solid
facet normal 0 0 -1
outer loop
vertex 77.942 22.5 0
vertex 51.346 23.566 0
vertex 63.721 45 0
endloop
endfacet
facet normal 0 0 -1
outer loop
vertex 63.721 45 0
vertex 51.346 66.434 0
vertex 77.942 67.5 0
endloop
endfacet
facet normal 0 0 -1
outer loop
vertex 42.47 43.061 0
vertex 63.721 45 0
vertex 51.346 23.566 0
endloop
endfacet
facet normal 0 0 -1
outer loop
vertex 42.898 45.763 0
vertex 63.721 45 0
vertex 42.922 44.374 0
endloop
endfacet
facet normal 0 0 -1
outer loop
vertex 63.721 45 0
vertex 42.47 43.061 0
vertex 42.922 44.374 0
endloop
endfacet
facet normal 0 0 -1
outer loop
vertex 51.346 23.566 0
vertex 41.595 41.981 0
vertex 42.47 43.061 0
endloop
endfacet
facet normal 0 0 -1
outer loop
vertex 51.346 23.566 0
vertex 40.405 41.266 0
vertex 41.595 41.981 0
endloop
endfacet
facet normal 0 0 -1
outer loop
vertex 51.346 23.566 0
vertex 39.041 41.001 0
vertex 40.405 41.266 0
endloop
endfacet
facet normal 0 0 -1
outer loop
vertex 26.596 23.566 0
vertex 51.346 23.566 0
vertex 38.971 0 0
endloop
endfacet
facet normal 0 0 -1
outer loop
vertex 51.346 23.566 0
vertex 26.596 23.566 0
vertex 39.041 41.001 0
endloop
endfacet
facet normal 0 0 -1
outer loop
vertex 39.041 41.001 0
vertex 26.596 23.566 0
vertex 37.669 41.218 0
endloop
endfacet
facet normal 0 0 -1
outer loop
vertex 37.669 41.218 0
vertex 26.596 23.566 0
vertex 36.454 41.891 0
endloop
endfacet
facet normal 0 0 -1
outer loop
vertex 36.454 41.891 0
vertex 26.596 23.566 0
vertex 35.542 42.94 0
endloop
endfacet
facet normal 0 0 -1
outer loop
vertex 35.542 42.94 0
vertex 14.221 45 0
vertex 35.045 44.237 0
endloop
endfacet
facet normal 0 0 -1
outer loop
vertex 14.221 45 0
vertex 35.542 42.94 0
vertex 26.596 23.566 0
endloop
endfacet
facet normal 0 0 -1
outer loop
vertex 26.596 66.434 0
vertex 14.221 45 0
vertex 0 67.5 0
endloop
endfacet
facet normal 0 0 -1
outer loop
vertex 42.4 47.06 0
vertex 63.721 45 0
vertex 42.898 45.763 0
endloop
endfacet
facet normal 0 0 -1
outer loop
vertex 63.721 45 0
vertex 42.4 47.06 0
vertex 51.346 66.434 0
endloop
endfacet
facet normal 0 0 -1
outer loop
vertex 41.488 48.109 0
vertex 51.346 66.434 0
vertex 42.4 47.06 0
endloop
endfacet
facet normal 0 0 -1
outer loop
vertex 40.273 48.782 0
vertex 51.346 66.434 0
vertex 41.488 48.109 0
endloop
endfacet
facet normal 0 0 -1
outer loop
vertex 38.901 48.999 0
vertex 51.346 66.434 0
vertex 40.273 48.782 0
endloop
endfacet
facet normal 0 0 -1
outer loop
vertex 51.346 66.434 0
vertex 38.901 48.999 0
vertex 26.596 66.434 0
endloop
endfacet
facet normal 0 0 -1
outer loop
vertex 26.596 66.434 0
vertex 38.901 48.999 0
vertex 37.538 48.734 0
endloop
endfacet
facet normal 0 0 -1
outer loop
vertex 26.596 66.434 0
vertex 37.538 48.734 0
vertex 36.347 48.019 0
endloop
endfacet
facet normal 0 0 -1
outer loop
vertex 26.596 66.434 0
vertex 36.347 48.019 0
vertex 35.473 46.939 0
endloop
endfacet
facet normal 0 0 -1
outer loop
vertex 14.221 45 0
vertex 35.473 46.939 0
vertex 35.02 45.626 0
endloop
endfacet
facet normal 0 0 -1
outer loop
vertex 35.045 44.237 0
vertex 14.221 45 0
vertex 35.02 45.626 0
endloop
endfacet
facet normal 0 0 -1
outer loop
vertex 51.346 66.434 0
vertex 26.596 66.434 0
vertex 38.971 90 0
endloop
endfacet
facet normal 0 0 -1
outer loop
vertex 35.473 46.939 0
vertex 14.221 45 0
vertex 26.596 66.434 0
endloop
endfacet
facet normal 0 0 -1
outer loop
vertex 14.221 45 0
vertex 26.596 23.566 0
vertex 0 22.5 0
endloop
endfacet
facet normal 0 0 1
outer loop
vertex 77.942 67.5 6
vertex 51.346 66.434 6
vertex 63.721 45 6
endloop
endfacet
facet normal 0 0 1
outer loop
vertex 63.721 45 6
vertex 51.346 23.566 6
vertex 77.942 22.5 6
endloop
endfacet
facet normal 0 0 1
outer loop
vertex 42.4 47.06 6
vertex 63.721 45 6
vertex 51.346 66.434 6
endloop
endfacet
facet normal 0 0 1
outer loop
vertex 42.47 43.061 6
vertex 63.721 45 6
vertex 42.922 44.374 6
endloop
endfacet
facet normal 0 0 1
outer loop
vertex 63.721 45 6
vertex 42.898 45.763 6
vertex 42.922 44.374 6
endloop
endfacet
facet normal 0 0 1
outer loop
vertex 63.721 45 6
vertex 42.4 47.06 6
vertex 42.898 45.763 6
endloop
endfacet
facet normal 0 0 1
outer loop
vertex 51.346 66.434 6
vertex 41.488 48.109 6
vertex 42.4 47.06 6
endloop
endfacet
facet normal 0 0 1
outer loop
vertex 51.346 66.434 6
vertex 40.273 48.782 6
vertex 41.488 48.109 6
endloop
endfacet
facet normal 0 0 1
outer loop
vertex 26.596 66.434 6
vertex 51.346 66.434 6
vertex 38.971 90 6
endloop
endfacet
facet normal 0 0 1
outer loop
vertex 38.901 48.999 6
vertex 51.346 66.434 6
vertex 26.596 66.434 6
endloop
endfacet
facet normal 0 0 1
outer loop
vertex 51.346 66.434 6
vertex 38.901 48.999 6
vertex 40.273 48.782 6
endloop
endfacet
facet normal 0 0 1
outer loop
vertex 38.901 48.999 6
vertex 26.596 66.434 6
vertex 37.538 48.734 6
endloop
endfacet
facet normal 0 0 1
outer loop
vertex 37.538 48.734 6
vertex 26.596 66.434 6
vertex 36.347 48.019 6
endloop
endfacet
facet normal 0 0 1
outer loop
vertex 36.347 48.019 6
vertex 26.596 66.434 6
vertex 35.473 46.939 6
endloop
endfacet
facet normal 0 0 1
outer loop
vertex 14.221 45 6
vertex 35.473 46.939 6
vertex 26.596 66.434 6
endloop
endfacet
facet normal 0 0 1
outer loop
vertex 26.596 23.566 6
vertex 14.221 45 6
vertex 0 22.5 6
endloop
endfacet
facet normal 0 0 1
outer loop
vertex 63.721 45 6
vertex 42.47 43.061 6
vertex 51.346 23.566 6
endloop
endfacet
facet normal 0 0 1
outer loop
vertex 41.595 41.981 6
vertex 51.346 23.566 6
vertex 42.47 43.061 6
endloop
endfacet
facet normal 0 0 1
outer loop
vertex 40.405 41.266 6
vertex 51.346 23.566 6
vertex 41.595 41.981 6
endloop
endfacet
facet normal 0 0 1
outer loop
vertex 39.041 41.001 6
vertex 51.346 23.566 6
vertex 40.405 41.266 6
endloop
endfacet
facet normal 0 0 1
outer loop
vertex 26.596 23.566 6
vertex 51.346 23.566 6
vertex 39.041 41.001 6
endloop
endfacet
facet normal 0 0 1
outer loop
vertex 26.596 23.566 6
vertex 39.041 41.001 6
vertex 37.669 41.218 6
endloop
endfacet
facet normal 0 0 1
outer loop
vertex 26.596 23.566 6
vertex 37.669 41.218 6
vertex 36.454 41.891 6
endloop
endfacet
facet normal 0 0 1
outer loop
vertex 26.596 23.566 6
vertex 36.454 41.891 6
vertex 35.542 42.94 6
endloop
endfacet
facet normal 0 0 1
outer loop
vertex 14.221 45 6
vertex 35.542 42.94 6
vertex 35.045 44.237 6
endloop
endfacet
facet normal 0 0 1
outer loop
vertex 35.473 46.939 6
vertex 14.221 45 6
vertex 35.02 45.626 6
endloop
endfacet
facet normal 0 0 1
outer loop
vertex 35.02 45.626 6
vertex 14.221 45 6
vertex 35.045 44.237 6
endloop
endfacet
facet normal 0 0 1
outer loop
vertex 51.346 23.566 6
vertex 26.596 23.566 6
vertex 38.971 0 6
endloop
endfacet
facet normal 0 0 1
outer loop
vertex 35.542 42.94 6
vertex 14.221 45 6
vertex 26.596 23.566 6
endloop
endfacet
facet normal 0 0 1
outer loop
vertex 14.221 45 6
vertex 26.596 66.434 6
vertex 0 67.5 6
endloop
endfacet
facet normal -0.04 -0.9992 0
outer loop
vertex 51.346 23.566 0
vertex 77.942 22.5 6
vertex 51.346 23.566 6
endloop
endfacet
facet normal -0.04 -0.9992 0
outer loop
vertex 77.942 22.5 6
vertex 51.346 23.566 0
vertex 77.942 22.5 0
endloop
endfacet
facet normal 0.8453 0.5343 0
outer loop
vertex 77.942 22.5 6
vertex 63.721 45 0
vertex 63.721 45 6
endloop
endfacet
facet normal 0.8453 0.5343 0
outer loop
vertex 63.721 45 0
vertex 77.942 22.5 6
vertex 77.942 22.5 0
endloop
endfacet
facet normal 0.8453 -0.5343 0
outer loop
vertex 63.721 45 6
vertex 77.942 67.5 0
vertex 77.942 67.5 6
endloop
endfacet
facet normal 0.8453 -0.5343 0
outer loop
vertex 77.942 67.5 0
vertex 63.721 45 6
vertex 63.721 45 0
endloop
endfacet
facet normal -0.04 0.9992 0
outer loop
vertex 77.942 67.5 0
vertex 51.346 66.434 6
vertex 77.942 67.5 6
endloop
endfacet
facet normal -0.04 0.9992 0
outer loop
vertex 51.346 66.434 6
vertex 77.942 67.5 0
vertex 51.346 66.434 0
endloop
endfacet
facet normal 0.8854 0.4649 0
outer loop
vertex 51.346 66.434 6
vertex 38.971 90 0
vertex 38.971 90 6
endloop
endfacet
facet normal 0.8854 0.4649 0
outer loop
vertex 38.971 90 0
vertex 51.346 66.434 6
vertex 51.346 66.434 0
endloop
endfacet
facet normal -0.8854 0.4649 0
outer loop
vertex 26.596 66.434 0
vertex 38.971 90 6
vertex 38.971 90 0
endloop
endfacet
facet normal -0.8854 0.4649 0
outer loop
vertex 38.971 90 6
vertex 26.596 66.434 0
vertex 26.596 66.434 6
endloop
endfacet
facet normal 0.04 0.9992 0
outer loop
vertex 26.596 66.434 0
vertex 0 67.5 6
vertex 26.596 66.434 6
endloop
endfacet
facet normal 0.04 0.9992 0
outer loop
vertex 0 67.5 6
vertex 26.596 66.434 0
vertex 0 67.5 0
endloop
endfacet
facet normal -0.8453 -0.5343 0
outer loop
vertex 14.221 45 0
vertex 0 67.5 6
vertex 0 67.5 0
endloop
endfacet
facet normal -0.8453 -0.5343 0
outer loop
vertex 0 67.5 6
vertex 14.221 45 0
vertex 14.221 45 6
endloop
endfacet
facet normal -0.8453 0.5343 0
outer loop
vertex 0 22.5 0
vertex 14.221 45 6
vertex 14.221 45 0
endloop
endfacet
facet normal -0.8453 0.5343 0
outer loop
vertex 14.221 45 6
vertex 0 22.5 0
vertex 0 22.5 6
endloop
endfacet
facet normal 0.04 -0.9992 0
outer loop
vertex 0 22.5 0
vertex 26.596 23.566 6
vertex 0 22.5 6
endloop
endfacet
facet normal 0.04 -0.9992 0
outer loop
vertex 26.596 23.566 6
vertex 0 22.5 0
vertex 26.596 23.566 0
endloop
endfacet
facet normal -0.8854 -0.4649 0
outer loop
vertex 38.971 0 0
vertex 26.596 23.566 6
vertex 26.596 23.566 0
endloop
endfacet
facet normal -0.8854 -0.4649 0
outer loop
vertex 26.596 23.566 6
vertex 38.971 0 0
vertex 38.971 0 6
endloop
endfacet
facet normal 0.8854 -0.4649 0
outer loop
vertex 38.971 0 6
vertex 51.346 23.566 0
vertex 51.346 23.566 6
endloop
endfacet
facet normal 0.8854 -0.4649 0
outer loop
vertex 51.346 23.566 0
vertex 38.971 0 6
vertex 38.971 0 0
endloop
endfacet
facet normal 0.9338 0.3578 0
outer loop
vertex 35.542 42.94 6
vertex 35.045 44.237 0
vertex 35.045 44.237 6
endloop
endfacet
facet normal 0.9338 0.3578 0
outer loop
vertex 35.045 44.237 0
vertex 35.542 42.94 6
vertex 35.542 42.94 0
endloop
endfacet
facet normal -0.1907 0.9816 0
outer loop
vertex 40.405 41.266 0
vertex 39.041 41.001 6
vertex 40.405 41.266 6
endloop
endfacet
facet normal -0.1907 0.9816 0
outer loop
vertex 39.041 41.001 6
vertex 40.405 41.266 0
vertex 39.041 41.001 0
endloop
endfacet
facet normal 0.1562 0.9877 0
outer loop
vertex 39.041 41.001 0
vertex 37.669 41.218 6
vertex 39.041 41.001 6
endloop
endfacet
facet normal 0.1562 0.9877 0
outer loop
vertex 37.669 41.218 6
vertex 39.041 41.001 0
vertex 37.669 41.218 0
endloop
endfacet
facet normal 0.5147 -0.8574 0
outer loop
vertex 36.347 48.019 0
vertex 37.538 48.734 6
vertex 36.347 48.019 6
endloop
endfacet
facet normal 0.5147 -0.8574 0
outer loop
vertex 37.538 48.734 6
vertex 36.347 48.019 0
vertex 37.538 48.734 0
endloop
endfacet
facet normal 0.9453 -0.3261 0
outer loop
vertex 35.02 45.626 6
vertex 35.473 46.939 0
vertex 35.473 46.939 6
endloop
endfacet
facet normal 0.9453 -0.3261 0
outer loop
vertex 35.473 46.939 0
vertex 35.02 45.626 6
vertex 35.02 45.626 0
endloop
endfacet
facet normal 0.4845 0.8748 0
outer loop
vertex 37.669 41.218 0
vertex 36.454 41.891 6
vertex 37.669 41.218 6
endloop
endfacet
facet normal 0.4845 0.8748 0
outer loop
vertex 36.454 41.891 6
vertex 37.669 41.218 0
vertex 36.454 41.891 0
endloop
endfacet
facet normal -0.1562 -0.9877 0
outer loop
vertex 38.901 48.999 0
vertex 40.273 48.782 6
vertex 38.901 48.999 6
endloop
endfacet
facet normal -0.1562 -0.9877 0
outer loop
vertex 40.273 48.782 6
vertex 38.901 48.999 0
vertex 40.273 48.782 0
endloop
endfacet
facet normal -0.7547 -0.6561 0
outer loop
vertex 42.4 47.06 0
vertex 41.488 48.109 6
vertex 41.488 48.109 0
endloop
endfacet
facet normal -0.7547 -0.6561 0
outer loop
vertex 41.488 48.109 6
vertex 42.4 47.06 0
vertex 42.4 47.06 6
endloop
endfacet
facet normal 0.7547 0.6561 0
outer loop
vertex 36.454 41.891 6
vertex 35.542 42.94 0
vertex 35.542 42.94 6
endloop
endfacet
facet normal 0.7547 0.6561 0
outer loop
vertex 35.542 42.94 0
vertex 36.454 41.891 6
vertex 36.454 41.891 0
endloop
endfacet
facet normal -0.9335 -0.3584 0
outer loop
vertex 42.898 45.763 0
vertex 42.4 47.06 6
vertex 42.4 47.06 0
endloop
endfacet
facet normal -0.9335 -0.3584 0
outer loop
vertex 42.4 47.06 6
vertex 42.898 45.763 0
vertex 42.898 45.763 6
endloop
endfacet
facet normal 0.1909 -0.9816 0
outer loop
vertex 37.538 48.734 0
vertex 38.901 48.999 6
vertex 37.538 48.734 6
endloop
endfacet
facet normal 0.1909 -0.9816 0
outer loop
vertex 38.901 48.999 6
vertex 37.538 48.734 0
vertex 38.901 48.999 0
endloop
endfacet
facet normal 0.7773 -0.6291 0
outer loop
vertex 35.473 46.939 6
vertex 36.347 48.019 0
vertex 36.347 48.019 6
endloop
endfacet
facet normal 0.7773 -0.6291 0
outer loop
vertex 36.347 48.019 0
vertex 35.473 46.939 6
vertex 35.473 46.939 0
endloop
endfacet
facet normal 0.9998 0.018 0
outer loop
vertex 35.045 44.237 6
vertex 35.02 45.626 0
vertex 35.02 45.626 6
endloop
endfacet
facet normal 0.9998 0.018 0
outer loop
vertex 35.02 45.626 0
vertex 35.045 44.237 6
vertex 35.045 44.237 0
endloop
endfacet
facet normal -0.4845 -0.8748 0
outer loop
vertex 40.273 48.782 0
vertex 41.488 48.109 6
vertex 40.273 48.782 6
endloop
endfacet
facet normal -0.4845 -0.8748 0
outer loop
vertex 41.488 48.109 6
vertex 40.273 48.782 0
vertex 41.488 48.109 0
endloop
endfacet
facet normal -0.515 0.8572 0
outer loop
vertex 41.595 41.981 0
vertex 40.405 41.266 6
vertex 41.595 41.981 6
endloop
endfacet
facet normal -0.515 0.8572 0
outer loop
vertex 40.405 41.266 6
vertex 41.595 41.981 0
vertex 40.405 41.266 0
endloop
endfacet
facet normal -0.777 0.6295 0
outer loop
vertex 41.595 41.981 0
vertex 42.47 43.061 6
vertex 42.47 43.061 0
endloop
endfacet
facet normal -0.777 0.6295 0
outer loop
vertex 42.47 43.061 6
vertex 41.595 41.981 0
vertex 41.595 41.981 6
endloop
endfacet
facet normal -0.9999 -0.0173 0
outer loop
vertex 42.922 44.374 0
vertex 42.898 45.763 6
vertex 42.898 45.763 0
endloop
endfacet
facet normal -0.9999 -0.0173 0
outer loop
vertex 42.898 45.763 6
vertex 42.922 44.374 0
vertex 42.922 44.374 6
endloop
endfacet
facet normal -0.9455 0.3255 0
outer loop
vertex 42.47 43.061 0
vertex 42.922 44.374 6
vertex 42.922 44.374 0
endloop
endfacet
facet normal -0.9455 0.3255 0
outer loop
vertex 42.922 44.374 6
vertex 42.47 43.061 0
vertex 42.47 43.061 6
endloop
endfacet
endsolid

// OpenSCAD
$fn = 32;

// ----------------------------------------------------------------------
// Star wheel: 6-point star, R45
// ----------------------------------------------------------------------

// --- parameters (mm) ---
n_points = 6;             // number of points / teeth
r_out = 45;               // tip radius
r_in = 24.75;             // root radius
bore_r = 4;               // centre bore radius
plate_t = 6;              // plate thickness, Z (extrusion height)
bore_d = 8;               // centre bore diameter

profile = [[38.971, 90], [26.596, 66.434], [0, 67.5], [14.221, 45], [0, 22.5], [26.596, 23.566], [38.971, 0], [51.346, 23.566], [77.942, 22.5], [63.721, 45], [77.942, 67.5], [51.346, 66.434]];  // primary outline, 12 points, counter clockwise
void_1 = [[42.898, 45.763], [42.4, 47.06], [41.488, 48.109], [40.273, 48.782], [38.901, 48.999], [37.538, 48.734], [36.347, 48.019], [35.473, 46.939], [35.02, 45.626], [35.045, 44.237], [35.542, 42.94], [36.454, 41.891], [37.669, 41.218], [39.041, 41.001], [40.405, 41.266], [41.595, 41.981], [42.47, 43.061], [42.922, 44.374]];  // centre bore, 18 points

// --- the one profile operation ---
difference() {
  linear_extrude(height = plate_t) polygon(points = profile);
  translate([0, 0, -1])
    linear_extrude(height = plate_t + 2) polygon(points = void_1);
}
